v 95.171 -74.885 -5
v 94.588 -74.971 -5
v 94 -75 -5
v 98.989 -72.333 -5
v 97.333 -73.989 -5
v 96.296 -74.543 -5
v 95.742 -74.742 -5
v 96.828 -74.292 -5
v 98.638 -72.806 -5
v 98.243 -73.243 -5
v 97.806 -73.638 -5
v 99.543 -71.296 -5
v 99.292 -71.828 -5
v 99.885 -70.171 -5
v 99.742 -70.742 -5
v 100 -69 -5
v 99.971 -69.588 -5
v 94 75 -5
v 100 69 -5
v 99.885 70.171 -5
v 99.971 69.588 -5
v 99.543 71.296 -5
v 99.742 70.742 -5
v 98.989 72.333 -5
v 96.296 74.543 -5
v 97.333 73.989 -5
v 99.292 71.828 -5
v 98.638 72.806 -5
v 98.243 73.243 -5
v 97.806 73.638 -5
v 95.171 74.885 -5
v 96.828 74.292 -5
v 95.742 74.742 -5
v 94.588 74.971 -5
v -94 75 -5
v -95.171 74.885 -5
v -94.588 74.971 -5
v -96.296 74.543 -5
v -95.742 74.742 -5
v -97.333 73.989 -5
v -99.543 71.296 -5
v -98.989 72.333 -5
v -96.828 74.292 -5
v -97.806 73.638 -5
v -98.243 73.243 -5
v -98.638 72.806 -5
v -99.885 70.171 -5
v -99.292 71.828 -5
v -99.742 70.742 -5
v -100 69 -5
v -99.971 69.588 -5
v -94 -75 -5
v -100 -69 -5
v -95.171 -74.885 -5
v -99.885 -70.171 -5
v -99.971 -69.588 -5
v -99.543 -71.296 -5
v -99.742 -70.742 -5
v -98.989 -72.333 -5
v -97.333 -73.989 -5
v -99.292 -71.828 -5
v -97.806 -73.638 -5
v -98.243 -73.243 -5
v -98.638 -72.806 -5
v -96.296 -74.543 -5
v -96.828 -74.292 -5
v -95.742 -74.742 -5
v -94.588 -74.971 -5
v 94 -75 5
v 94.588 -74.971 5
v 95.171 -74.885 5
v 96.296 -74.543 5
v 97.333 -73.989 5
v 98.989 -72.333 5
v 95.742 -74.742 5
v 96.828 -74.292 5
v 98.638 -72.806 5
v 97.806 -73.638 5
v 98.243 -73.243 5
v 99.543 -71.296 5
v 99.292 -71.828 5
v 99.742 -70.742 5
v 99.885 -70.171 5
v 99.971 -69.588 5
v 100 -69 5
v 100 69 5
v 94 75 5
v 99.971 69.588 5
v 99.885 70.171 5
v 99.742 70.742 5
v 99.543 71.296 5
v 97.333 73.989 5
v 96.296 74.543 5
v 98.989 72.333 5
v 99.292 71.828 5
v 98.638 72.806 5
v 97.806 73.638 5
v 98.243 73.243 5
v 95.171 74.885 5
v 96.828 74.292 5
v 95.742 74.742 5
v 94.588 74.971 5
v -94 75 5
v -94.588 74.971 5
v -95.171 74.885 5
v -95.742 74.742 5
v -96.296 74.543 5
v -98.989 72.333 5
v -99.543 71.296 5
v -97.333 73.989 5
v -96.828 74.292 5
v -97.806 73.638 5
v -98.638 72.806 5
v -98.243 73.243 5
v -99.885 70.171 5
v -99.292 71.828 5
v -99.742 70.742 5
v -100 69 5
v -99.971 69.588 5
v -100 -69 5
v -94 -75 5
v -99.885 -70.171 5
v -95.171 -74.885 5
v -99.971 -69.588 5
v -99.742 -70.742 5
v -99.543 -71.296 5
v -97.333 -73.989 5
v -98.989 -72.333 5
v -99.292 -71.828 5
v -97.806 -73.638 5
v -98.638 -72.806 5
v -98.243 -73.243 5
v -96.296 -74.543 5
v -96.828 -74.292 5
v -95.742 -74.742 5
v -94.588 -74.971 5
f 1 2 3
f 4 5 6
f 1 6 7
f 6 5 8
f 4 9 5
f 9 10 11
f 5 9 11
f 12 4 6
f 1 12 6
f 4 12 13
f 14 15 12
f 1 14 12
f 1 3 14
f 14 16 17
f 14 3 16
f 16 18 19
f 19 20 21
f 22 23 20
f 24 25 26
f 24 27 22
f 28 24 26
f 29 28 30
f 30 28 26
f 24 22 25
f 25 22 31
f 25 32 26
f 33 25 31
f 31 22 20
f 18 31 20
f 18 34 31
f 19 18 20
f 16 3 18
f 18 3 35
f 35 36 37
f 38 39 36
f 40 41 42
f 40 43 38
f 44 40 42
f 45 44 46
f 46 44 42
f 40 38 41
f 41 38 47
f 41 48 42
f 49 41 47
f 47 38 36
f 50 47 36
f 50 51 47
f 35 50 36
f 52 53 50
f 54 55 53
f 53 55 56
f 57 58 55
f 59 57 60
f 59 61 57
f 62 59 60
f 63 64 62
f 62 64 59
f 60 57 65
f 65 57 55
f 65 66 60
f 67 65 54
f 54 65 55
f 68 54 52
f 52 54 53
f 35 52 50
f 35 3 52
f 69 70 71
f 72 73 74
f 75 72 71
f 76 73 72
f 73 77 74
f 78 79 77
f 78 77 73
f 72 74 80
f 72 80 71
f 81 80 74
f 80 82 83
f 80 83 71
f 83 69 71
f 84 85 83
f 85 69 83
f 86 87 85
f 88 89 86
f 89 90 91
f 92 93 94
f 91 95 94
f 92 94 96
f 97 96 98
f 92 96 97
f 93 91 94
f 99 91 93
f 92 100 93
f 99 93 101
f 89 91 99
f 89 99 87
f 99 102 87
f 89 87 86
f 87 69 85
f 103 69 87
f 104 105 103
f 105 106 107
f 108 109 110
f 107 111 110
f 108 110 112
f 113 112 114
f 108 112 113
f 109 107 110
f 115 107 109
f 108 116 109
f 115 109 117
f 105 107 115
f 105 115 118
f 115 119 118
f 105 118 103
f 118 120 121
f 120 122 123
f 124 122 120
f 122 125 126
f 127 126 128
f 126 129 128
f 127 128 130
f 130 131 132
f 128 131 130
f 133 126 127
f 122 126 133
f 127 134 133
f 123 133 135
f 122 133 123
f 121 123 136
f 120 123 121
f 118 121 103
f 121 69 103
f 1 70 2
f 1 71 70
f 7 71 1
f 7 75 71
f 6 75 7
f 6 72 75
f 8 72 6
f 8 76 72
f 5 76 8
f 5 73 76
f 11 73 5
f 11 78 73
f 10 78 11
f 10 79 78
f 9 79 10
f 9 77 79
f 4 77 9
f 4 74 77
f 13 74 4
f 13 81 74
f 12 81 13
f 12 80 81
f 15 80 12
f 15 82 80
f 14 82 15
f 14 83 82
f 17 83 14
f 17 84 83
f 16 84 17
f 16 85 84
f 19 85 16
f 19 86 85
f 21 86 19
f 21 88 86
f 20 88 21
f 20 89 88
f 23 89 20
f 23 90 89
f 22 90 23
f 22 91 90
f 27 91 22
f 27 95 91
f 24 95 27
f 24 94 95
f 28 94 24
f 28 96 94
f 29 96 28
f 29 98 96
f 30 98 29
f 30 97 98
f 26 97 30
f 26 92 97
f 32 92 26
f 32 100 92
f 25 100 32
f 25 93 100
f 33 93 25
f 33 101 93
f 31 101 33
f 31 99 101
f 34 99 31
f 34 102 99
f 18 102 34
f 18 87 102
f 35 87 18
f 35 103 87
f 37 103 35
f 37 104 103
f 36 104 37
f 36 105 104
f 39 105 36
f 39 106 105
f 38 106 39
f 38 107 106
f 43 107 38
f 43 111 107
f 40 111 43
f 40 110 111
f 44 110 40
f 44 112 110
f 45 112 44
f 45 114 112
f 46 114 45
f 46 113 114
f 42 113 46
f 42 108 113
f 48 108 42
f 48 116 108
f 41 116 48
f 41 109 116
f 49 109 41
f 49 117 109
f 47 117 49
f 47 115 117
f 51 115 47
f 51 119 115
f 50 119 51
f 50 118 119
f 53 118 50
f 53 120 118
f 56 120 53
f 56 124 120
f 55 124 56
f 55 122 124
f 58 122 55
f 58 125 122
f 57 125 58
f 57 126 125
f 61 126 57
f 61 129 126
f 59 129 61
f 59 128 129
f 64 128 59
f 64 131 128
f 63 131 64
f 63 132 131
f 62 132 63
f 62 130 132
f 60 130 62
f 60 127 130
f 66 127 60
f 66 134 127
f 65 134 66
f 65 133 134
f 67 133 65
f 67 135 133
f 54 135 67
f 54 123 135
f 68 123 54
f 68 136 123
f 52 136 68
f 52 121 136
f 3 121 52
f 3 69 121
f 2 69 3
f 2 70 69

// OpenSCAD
$fn=64;

module tooling_plate(length=200, width=150, thickness=10, corner_r=6) {
    corner_r2 = min(corner_r, min(length, width)/2);
    linear_extrude(height=thickness, center=true)
        offset(r=corner_r2)
            square([length-2*corner_r2, width-2*corner_r2], center=true);
}

tooling_plate();
